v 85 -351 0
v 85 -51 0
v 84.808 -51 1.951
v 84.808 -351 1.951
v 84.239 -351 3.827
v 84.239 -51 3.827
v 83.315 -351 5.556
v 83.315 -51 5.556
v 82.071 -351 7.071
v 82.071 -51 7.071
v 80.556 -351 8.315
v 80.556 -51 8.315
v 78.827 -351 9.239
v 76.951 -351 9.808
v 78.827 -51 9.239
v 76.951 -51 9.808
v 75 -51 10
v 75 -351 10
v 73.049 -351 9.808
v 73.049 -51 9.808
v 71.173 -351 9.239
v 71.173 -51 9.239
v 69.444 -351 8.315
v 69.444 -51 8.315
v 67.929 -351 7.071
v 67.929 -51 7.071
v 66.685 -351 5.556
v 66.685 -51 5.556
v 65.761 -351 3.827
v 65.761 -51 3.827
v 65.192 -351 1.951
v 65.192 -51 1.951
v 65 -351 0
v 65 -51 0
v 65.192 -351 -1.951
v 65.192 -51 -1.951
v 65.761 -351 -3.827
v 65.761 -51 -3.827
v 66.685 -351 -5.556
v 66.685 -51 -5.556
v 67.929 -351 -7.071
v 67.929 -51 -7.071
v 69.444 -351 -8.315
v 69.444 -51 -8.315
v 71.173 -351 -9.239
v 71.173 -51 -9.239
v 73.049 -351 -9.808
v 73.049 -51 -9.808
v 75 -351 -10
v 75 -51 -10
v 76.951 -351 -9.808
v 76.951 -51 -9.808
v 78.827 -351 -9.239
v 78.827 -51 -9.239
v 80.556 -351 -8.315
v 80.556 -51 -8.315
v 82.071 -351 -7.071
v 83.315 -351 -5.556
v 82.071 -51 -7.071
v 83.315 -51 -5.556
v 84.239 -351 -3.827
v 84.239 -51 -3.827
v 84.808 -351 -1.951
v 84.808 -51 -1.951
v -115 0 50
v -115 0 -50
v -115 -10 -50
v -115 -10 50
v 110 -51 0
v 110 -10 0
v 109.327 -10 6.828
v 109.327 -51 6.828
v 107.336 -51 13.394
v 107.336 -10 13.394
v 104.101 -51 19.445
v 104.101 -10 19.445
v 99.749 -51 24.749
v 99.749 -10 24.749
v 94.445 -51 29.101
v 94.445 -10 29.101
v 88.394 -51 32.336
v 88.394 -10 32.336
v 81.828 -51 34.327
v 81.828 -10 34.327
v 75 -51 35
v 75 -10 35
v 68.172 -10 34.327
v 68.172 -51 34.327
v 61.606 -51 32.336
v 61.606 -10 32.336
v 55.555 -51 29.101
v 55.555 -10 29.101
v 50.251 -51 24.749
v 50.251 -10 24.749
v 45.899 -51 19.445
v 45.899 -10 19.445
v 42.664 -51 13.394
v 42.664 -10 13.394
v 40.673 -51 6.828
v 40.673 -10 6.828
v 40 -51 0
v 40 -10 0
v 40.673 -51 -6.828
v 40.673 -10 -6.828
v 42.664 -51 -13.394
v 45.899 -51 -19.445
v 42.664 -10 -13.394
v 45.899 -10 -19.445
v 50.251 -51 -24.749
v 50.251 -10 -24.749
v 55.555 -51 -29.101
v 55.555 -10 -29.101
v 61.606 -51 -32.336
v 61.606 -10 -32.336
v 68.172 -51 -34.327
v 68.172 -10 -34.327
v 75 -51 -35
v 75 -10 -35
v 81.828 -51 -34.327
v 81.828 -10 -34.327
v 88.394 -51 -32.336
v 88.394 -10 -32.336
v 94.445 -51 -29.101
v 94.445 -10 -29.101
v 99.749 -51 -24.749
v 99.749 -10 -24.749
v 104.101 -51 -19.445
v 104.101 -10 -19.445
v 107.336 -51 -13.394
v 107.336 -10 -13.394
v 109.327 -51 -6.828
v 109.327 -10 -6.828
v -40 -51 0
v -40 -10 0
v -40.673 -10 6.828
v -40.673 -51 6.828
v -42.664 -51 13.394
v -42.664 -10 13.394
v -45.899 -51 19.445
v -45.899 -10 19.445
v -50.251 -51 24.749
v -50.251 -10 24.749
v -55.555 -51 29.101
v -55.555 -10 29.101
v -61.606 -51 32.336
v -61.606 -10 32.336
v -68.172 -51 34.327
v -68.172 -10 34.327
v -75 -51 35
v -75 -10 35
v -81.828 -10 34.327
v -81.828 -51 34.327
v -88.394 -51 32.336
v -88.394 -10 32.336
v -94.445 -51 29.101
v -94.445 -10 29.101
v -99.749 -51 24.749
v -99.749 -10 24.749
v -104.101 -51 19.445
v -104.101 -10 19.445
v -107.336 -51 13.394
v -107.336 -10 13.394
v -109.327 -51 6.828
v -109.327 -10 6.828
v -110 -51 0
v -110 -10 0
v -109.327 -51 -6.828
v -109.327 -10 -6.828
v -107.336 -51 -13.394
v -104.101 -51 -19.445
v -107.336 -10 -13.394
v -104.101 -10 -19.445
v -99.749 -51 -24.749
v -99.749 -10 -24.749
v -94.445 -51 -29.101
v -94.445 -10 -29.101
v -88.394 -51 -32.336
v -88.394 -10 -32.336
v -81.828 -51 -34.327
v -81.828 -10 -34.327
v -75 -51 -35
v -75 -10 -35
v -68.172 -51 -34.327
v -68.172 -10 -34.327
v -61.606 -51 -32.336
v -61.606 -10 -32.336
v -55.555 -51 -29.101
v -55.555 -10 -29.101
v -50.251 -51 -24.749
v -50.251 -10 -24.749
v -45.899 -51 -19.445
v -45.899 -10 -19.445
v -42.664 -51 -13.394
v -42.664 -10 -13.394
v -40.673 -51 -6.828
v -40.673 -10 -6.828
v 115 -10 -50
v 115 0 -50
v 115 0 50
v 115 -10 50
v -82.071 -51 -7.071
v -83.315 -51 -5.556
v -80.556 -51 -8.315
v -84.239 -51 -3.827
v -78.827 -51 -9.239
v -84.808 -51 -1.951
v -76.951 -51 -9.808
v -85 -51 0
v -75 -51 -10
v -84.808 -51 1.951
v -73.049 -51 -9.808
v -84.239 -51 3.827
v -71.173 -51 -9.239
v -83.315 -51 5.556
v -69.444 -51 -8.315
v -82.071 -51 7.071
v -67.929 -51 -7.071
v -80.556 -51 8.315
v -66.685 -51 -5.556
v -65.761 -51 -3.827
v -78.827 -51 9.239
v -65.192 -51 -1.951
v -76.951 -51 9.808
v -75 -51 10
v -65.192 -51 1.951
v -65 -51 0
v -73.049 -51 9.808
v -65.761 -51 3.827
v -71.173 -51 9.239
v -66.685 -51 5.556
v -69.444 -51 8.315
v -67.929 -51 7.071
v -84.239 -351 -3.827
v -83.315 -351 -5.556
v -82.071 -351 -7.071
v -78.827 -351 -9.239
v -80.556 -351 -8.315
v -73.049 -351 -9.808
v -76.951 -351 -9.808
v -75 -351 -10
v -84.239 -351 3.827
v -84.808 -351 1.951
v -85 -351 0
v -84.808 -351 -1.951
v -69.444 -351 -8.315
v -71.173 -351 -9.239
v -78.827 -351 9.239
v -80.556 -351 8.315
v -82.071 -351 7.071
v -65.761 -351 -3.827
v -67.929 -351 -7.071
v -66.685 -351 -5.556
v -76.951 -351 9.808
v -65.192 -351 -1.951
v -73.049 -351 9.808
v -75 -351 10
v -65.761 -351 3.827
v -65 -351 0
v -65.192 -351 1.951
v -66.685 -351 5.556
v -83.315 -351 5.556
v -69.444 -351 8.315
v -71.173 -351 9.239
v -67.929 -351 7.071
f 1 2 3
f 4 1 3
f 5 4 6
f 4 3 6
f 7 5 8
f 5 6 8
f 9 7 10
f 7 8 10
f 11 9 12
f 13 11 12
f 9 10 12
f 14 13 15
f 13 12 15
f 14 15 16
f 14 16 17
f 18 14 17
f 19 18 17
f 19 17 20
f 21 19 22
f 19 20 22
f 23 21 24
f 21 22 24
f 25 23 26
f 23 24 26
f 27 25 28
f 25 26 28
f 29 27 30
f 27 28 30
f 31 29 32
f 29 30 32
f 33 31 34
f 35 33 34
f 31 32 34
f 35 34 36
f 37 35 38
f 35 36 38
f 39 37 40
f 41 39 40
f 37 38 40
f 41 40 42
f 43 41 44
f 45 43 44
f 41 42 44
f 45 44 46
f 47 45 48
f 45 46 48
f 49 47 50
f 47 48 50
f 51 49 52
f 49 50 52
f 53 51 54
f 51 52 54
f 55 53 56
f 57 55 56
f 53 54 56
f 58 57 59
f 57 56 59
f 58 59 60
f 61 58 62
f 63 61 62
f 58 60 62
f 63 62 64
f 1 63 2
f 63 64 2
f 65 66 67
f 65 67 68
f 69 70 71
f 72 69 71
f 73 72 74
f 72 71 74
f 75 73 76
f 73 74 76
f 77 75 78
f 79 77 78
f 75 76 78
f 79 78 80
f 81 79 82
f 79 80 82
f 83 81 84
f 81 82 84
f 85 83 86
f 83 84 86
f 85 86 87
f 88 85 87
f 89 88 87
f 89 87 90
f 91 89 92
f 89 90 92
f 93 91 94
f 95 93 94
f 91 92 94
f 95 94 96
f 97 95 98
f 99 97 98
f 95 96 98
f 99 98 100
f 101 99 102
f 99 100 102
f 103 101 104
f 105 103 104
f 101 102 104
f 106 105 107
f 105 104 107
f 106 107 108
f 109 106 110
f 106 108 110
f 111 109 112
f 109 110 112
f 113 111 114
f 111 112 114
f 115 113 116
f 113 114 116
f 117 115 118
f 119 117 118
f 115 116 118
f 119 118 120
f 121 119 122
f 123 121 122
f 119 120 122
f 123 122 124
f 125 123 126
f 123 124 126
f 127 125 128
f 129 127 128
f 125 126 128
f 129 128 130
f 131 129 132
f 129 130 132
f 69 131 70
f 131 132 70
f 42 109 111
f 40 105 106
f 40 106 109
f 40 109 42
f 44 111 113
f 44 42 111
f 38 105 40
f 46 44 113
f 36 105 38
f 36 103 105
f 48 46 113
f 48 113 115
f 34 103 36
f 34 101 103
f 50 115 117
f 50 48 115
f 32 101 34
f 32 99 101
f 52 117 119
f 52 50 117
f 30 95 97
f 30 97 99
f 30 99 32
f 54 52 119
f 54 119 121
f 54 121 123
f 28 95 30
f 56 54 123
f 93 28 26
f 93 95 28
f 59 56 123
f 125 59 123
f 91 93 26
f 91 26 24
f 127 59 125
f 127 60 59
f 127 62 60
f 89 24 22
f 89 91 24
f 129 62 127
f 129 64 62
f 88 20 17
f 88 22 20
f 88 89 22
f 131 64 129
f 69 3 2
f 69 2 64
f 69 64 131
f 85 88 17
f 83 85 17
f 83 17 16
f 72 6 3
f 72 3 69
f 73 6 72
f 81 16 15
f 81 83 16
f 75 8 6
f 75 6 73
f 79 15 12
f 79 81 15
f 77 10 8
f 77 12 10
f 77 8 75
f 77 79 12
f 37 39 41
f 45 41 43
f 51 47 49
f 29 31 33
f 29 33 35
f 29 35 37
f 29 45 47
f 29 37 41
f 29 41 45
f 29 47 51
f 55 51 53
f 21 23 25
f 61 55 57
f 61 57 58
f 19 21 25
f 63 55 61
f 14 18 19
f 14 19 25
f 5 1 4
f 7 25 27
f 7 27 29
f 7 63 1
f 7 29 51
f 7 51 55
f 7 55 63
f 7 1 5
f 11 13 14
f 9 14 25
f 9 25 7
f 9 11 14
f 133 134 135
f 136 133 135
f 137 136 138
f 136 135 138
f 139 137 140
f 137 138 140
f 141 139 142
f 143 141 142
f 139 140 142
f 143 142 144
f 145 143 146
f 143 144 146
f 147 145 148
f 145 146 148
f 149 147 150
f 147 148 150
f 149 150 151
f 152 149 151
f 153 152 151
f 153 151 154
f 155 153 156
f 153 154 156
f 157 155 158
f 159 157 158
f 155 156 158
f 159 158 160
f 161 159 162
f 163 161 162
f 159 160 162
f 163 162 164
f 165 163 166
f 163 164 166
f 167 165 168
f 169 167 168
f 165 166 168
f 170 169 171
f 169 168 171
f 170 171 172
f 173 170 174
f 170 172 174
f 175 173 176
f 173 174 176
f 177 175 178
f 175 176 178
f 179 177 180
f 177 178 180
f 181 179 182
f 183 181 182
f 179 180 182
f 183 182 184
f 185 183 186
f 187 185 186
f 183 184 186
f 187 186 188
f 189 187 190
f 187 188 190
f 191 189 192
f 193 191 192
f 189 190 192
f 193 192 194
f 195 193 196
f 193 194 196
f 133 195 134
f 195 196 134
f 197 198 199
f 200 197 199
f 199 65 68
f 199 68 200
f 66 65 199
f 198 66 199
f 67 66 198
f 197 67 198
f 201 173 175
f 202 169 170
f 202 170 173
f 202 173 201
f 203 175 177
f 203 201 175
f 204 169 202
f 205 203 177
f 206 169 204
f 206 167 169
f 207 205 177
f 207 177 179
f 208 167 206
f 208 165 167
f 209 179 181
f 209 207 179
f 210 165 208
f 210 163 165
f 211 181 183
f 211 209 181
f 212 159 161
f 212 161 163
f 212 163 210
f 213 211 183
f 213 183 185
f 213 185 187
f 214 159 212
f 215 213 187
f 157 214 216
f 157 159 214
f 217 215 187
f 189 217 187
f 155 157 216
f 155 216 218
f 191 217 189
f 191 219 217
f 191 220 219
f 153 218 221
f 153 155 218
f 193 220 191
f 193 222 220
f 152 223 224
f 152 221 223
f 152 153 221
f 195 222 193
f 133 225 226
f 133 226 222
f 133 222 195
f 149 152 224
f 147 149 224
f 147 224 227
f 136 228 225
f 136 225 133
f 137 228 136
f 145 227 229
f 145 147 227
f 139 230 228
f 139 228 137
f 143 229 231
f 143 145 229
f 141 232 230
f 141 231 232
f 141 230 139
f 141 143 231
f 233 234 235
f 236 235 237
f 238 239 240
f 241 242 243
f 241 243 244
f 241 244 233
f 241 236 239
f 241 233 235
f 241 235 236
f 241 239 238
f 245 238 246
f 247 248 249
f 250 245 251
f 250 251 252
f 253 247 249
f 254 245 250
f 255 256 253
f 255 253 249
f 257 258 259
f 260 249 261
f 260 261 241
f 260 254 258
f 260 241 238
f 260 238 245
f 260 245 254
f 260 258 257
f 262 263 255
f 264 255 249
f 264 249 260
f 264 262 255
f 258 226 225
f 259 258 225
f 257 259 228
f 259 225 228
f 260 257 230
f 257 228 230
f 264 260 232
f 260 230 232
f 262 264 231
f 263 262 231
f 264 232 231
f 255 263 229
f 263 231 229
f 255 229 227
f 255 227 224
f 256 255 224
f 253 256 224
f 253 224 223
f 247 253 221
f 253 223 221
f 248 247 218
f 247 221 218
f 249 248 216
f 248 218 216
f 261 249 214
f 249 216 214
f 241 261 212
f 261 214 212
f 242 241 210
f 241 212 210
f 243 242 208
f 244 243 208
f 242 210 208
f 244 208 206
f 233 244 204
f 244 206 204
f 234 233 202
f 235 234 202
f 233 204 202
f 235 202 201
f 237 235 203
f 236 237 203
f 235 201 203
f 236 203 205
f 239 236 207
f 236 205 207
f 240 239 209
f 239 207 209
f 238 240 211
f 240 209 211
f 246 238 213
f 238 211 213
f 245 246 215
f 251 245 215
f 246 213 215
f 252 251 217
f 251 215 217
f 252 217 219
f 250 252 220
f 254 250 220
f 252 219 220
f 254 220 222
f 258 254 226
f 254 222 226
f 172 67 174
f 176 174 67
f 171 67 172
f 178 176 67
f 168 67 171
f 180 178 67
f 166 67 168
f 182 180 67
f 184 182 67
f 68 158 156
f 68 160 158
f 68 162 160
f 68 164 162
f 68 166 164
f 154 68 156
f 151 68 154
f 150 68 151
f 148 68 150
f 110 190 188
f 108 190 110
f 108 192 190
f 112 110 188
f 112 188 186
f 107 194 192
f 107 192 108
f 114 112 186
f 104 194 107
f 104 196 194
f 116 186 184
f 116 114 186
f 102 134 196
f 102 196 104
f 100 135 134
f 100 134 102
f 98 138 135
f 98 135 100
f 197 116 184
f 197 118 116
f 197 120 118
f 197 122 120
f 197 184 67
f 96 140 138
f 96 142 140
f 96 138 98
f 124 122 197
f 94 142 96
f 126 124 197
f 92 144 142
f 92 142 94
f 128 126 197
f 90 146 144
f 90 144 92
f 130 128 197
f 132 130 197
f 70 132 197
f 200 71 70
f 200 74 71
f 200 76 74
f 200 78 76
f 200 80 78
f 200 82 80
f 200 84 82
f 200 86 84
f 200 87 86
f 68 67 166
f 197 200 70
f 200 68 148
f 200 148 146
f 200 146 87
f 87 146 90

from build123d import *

# Parameters (mm, degrees)
F0_W     = 230
F0_H     = 100
F1_DEPTH = 10
F2_R     = 35
F3_DEPTH = 41
F4_R     = 10
F5_DEPTH = 300


with BuildPart() as f1:
    # F0 (on Front) → F1 (new body)
    with BuildSketch(Plane.XZ):
        Rectangle(F0_W, F0_H)
    extrude(amount=F1_DEPTH)

    # F2 (on face) → F3 (join)
    with BuildSketch(Plane.XZ.offset(10)):
        with Locations((-75, 0)):
            Circle(F2_R)
        with Locations((75, 0)):
            Circle(F2_R)
    extrude(amount=F3_DEPTH)

    # F4 (on face) → F5 (join)
    with BuildSketch(Plane.XZ.offset(51)):
        with Locations((-75, 0)):
            Circle(F4_R)
        with Locations((75, 0)):
            Circle(F4_R)
    extrude(amount=F5_DEPTH)


solid = f1.part
